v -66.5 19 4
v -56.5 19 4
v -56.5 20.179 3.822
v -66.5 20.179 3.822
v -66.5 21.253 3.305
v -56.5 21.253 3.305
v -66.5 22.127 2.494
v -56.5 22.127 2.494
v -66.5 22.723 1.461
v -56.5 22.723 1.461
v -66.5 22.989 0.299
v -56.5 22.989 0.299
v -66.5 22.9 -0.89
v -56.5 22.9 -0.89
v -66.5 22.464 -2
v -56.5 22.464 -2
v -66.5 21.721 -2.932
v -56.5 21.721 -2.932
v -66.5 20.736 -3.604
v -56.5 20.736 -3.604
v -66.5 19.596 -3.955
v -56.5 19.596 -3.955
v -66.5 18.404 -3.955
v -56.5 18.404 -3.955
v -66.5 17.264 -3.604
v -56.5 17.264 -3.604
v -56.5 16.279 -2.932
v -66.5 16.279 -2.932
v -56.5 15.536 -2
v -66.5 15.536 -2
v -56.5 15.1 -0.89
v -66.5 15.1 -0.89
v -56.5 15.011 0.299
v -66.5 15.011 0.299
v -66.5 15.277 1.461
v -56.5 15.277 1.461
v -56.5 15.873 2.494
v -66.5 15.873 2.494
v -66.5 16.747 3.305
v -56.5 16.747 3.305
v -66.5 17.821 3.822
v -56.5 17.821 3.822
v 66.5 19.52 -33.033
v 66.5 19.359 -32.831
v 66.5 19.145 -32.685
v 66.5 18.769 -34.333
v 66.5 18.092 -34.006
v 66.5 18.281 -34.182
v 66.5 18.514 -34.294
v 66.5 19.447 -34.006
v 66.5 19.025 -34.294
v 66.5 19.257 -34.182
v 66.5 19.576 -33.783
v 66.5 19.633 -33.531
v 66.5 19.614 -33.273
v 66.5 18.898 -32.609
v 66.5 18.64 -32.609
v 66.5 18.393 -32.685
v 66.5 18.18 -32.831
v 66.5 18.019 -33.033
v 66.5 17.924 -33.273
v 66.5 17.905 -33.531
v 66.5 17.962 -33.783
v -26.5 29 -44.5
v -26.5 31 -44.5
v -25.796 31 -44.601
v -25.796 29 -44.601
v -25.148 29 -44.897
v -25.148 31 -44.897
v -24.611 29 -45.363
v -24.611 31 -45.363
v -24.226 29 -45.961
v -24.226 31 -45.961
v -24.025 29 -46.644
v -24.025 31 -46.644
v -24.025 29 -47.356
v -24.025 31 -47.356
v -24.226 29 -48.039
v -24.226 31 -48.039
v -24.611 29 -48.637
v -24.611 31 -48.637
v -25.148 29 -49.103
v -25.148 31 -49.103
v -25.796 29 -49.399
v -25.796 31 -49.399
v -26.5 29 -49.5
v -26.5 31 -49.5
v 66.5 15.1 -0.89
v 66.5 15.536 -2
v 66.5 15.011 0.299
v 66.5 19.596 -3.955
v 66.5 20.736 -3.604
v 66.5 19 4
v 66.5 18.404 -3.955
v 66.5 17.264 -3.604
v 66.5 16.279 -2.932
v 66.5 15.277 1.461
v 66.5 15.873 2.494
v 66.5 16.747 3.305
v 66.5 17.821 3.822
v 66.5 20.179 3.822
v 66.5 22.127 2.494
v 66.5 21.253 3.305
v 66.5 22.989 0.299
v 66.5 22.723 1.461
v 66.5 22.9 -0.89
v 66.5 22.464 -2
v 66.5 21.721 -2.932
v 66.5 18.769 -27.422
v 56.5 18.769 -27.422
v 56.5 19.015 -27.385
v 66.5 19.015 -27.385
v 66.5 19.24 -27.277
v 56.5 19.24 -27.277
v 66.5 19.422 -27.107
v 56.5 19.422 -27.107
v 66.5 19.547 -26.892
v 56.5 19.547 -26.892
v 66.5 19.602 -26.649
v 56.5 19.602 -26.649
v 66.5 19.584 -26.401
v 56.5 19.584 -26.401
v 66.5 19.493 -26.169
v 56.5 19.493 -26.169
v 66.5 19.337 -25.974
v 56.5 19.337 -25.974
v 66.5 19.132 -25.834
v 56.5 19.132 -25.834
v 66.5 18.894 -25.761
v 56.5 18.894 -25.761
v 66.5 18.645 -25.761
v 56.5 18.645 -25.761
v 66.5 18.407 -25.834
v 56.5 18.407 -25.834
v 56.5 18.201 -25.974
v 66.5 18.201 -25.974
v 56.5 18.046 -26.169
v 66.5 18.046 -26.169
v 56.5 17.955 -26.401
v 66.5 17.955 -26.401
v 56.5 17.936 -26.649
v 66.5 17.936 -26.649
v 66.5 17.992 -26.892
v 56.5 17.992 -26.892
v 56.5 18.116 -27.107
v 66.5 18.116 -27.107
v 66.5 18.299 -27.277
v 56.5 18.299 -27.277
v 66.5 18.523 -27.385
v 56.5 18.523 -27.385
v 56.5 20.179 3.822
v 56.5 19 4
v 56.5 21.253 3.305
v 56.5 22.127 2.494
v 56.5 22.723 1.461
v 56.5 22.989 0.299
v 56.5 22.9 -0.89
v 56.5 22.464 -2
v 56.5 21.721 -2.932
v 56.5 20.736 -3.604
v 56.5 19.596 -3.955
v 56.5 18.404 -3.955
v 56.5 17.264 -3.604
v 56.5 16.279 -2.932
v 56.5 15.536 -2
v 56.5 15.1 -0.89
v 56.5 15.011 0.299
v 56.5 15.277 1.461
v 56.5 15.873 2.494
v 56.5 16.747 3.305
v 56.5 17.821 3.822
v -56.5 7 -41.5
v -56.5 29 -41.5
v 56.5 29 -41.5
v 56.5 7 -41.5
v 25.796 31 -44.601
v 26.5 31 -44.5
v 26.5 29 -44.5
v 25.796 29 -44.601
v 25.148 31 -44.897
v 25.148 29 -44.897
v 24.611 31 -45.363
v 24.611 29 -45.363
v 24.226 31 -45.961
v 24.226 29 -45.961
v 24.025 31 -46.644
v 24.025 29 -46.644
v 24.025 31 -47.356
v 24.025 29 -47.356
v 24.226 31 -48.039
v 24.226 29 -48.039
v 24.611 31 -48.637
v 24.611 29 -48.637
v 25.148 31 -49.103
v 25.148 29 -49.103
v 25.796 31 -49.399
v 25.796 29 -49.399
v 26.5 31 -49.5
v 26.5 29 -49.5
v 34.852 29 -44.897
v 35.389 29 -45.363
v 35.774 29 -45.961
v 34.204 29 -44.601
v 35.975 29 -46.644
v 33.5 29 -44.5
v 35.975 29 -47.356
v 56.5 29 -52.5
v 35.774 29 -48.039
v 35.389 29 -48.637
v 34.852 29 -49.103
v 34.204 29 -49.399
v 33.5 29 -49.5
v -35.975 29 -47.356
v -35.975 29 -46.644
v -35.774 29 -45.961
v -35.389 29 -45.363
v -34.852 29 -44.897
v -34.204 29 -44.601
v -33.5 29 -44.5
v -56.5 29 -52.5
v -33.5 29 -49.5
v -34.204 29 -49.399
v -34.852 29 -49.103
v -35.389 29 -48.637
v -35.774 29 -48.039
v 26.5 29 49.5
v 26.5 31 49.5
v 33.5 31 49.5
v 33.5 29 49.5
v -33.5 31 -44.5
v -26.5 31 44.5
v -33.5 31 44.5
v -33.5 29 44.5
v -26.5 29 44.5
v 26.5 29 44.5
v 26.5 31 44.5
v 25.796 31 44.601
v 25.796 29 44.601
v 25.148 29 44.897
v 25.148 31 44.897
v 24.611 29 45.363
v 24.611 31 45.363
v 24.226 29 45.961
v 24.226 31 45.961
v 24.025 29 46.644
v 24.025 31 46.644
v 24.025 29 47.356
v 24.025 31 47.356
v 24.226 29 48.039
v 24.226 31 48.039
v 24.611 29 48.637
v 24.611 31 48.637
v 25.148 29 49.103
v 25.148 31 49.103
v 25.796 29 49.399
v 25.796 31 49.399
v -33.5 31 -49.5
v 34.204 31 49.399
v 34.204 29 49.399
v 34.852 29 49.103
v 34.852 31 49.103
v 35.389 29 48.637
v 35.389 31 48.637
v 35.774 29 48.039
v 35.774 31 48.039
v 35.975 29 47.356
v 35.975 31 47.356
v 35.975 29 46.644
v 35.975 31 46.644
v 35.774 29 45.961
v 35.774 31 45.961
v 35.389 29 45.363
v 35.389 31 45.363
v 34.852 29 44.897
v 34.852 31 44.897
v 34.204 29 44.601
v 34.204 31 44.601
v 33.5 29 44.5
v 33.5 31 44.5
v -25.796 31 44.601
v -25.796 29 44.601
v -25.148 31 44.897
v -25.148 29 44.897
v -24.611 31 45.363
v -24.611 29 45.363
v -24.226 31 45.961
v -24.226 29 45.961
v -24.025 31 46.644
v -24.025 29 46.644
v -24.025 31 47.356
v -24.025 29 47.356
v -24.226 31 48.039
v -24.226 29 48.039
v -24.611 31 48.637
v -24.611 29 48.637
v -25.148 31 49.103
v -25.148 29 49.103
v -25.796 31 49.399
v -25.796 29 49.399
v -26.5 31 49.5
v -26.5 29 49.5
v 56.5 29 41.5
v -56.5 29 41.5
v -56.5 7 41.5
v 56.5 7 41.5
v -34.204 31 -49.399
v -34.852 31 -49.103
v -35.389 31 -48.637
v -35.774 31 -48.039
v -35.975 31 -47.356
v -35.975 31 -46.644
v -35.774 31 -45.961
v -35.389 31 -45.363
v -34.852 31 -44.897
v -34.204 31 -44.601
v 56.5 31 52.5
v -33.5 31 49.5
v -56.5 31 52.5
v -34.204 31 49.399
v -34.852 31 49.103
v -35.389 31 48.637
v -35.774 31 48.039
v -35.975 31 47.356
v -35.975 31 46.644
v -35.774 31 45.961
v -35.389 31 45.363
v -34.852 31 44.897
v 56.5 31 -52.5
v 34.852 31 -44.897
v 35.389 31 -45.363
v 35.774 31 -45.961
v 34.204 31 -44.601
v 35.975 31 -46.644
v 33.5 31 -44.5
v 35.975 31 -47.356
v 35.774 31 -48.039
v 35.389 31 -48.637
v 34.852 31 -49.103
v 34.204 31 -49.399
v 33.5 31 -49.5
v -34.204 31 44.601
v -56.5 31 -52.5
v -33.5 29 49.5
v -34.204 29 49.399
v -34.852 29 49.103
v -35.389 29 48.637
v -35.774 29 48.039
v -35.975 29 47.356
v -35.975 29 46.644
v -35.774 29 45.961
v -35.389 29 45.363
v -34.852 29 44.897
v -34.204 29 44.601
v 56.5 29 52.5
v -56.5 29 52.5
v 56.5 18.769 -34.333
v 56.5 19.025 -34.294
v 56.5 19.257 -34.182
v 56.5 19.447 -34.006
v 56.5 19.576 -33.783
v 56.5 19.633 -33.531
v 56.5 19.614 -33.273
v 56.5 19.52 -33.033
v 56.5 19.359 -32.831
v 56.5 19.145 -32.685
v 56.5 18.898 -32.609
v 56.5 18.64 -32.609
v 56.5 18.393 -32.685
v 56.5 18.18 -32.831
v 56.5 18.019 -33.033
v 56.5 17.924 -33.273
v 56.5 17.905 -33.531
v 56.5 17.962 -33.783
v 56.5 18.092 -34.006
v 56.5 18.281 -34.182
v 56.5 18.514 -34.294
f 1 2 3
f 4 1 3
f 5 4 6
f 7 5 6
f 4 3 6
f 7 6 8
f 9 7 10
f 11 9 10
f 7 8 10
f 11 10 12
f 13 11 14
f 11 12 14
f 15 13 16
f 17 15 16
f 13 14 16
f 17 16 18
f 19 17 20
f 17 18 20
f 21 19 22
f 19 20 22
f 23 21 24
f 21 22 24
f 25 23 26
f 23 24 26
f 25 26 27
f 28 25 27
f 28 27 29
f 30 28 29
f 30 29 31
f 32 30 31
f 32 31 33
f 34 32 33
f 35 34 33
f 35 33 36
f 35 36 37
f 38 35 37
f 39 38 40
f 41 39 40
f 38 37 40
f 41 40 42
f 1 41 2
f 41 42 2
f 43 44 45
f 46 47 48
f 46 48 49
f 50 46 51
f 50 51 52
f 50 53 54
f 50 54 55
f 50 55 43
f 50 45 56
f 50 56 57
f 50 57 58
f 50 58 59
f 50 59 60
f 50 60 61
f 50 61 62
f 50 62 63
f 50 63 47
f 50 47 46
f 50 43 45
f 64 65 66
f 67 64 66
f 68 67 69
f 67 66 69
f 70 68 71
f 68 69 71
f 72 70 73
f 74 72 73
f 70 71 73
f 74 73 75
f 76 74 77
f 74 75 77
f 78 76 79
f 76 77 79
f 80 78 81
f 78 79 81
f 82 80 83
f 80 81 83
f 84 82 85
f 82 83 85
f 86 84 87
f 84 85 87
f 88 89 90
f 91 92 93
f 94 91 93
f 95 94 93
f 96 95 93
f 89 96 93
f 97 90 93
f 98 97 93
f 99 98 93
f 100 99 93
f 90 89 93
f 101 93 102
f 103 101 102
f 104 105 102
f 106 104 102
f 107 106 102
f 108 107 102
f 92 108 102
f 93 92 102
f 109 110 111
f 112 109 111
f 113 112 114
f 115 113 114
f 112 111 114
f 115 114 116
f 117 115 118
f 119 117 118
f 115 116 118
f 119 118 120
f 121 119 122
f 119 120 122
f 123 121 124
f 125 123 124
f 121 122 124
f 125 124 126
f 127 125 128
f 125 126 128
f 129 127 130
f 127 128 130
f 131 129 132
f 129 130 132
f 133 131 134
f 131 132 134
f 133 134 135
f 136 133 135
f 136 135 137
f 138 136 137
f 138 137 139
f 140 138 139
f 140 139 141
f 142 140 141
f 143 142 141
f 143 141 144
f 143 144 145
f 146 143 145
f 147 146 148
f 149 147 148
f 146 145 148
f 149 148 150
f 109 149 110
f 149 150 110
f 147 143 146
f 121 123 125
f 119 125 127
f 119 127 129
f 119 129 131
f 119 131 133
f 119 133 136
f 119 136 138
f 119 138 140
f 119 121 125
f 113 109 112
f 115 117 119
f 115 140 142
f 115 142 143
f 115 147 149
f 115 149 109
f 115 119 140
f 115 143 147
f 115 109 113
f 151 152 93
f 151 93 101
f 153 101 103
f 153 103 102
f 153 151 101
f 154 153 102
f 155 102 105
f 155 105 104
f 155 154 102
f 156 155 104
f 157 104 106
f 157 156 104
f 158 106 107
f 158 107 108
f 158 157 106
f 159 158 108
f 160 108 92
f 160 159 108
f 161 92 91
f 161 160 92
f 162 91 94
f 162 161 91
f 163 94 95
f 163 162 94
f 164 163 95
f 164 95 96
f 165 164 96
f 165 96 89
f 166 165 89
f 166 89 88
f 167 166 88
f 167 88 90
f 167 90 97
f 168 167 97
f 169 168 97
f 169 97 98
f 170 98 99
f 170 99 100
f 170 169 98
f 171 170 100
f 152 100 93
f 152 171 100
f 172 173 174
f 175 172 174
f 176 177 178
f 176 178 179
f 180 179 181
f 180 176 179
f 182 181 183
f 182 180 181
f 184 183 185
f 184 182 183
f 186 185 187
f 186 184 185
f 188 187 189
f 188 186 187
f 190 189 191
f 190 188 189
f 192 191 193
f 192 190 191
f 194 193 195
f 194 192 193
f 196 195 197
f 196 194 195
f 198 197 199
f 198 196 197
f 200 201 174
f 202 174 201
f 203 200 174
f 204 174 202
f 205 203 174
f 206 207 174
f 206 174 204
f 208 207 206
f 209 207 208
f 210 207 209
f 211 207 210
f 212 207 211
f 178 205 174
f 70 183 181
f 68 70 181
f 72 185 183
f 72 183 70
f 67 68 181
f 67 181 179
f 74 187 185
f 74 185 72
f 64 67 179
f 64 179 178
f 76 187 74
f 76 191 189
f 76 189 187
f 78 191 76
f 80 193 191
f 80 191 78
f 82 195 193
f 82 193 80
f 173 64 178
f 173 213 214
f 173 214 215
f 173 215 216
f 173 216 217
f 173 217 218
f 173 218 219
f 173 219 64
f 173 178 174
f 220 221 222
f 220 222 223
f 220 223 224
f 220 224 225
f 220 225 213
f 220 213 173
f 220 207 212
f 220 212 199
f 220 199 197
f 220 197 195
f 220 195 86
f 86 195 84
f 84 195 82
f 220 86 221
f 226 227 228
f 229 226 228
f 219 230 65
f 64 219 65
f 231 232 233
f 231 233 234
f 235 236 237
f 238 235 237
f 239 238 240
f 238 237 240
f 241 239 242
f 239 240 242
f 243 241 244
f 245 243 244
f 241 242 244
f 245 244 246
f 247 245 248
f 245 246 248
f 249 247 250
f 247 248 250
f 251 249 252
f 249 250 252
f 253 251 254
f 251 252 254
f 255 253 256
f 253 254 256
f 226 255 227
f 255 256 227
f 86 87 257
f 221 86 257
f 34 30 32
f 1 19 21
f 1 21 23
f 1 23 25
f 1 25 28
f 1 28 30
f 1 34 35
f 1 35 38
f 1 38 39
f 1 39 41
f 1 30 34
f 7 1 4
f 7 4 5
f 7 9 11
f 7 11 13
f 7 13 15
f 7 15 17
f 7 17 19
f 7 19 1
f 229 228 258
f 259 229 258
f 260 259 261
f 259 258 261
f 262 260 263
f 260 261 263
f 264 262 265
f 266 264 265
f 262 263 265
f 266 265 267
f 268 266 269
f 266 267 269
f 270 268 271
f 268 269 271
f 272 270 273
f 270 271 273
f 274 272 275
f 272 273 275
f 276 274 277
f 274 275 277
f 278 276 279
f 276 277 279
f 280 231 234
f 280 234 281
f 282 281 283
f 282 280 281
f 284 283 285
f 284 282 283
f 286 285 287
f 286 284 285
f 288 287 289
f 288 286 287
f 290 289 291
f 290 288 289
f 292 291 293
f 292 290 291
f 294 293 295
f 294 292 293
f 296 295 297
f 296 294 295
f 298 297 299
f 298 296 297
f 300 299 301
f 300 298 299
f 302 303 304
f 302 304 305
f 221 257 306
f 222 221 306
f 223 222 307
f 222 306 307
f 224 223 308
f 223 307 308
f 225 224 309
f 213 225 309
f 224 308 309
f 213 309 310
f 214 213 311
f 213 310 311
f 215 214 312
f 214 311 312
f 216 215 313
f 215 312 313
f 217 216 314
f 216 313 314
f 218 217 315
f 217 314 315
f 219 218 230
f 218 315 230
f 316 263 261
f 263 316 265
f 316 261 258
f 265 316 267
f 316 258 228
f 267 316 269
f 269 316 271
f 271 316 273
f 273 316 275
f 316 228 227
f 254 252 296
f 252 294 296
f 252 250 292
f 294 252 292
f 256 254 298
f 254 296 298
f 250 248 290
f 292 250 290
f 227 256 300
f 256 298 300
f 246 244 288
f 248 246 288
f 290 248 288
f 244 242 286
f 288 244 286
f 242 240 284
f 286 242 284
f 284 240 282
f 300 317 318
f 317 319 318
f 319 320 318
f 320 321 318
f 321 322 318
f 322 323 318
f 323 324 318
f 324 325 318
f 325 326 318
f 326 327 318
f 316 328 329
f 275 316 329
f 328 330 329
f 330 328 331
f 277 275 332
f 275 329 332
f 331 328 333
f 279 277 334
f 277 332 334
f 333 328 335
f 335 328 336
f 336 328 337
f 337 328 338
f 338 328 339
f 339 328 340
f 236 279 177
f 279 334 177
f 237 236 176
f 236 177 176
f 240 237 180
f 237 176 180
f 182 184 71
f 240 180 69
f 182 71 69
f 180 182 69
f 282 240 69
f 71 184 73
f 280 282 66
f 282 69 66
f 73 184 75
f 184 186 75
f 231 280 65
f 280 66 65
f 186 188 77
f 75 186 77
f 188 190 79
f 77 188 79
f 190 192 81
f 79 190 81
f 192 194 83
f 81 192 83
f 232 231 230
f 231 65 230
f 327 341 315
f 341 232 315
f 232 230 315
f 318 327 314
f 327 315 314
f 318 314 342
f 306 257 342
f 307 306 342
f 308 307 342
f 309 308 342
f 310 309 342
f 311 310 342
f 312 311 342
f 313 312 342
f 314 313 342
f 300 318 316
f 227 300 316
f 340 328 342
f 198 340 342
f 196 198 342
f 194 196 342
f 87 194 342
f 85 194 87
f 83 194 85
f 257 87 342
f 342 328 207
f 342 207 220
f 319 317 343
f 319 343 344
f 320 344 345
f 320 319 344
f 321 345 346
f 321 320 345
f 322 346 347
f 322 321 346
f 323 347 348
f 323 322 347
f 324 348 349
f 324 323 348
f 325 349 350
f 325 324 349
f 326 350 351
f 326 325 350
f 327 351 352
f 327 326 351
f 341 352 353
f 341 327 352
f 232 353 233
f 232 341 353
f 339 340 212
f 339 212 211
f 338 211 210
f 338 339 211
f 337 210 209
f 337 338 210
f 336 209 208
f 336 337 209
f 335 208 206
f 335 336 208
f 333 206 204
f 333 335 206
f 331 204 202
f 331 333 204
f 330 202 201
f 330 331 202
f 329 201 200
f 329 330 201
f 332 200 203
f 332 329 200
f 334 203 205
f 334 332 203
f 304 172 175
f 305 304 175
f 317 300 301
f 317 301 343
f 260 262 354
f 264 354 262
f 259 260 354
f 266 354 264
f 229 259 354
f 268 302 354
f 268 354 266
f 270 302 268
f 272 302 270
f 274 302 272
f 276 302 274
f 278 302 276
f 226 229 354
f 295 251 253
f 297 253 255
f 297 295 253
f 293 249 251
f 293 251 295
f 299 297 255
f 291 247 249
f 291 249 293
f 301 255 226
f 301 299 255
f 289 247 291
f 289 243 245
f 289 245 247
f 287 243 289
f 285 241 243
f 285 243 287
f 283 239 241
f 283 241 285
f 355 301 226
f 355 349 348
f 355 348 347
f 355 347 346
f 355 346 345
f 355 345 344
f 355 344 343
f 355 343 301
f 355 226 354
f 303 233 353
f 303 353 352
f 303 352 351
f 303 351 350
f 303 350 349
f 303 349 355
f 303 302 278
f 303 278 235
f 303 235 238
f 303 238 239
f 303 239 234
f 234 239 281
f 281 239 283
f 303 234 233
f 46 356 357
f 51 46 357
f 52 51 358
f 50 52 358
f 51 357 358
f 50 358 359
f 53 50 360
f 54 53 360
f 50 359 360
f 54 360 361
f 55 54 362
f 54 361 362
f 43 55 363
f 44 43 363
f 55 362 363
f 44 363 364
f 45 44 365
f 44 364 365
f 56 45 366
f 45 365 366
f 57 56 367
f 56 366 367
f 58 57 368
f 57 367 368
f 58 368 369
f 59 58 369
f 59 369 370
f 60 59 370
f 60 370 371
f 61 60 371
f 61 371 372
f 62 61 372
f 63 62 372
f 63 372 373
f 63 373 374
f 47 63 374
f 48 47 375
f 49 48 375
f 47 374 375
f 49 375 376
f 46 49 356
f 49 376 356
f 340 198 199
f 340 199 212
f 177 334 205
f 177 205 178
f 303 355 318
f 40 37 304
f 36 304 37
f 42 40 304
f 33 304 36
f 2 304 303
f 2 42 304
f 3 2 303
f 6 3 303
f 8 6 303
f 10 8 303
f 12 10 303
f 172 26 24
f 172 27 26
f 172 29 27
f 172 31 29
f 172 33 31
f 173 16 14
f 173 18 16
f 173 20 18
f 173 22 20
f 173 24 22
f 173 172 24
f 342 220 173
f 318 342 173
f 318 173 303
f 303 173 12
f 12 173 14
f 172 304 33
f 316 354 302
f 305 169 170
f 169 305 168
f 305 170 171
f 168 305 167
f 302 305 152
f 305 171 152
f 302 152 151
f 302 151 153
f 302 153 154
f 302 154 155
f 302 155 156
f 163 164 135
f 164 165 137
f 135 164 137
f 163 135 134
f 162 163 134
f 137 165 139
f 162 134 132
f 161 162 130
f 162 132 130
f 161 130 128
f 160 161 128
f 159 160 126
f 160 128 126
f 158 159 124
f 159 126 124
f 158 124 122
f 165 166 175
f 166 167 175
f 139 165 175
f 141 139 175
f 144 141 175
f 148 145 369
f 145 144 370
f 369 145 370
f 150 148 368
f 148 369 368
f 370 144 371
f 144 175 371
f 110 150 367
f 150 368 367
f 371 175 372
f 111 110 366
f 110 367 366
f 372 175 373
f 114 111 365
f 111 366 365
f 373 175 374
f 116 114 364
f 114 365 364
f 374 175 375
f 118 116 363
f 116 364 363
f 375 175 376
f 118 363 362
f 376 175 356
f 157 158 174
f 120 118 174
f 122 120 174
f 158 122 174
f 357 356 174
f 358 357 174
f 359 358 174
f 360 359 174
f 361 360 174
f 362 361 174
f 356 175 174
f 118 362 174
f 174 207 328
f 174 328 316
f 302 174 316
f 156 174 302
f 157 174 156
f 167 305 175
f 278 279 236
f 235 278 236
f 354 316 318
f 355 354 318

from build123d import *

# Parameters (mm, degrees)
SKETCH_1_W            = 113
SKETCH_1_H            = 83
EXTRUDE_1_DEPTH       = 24
SKETCH_21_W           = 113
SKETCH_21_H           = 2
EXTRUDE_2_DEPTH       = 52.5
CUT_EXTRUDE_20_DEPTH  = 81.774377125
MIRROR_2_COPY_1_DEPTH = 81.774377125
MIRROR_2_COPY_2_DEPTH = 81.774377125
SKETCH_27_R           = 4
EXTRUDE_4_DEPTH       = 10
SKETCH_28_R           = 0.835314329
SKETCH_28_R_2         = 0.866649433
EXTRUDE_5_DEPTH       = 10


with BuildPart() as part:
    # 草圖1 → 填料-伸長1 (new body)
    with BuildSketch(Plane(origin=(0, 31, 0), x_dir=(1, 0, 0), z_dir=(0, 1, 0))):
        Rectangle(SKETCH_1_W, SKETCH_1_H)
    extrude(amount=-EXTRUDE_1_DEPTH)

    # 草圖21 → 填料-伸長2 (add, symmetric)
    with BuildSketch(Plane(origin=(0, 0, 0), x_dir=(-1, 0, 0), z_dir=(0, 0, -1))):
        with Locations((0, 30)):
            Rectangle(SKETCH_21_W, SKETCH_21_H)
    extrude(amount=EXTRUDE_2_DEPTH, both=True)

    # 草圖22 → 除料-伸長20 (cut, through all)
    with BuildSketch(Plane(origin=(0, 31, 0), x_dir=(-1, 0, 0), z_dir=(0, 1, 0))):
        with BuildLine():
            Line((-33.5, -49.5), (-26.5, -49.5))
            ThreePointArc((-26.5, -49.5), (-24, -47), (-26.5, -44.5))
            Line((-26.5, -44.5), (-33.5, -44.5))
            ThreePointArc((-33.5, -44.5), (-36, -47), (-33.5, -49.5))
        make_face()
    cut_extrude_20 = extrude(amount=-CUT_EXTRUDE_20_DEPTH, mode=Mode.SUBTRACT)

    # 鏡射1: 除料-伸長20 across plane
    add(cut_extrude_20.mirror(Plane(origin=(0, 0, 0), x_dir=(0, 0, 1), z_dir=(1, 0, 0))), mode=Mode.SUBTRACT)

    # 鏡射2 copy 1 sketch → 鏡射2 copy 1 (cut, through all)
    with BuildSketch(Plane(origin=(0, 31, 0), x_dir=(1, 0, 0), z_dir=(0, 1, 0))):
        with BuildLine():
            Line((-33.5, -49.5), (-26.5, -49.5))
            ThreePointArc((-26.5, -49.5), (-24, -47), (-26.5, -44.5))
            Line((-26.5, -44.5), (-33.5, -44.5))
            ThreePointArc((-33.5, -44.5), (-36, -47), (-33.5, -49.5))
        make_face()
    extrude(amount=-MIRROR_2_COPY_1_DEPTH, mode=Mode.SUBTRACT)

    # 鏡射2 copy 2 sketch → 鏡射2 copy 2 (cut, through all)
    with BuildSketch(Plane(origin=(0, 31, 0), x_dir=(-1, 0, 0), z_dir=(0, 1, 0))):
        with BuildLine():
            Line((-33.5, 49.5), (-26.5, 49.5))
            ThreePointArc((-26.5, 49.5), (-24, 47), (-26.5, 44.5))
            Line((-26.5, 44.5), (-33.5, 44.5))
            ThreePointArc((-33.5, 44.5), (-36, 47), (-33.5, 49.5))
        make_face()
    extrude(amount=-MIRROR_2_COPY_2_DEPTH, mode=Mode.SUBTRACT)

    # 草圖27 → 填料-伸長4 (add)
    with BuildSketch(Plane.ZY.offset(56.5)):
        with Locations((0, 19)):
            Circle(SKETCH_27_R)
    extrude_4 = extrude(amount=EXTRUDE_4_DEPTH)

    # 鏡射3: 填料-伸長4 across plane
    add(extrude_4.mirror(Plane(origin=(0, 0, 0), x_dir=(0, 0, 1), z_dir=(1, 0, 0))))

    # 草圖28 → 填料-伸長5 (add)
    with BuildSketch(Plane(origin=(56.5, 0, 0), x_dir=(0, 0, -1), z_dir=(1, 0, 0))):
        with Locations((26.586559597, 18.769220483)):
            Circle(SKETCH_28_R)
        with Locations((33.466100625, 18.769220483)):
            Circle(SKETCH_28_R_2)
    extrude(amount=EXTRUDE_5_DEPTH)


solid = part.part
